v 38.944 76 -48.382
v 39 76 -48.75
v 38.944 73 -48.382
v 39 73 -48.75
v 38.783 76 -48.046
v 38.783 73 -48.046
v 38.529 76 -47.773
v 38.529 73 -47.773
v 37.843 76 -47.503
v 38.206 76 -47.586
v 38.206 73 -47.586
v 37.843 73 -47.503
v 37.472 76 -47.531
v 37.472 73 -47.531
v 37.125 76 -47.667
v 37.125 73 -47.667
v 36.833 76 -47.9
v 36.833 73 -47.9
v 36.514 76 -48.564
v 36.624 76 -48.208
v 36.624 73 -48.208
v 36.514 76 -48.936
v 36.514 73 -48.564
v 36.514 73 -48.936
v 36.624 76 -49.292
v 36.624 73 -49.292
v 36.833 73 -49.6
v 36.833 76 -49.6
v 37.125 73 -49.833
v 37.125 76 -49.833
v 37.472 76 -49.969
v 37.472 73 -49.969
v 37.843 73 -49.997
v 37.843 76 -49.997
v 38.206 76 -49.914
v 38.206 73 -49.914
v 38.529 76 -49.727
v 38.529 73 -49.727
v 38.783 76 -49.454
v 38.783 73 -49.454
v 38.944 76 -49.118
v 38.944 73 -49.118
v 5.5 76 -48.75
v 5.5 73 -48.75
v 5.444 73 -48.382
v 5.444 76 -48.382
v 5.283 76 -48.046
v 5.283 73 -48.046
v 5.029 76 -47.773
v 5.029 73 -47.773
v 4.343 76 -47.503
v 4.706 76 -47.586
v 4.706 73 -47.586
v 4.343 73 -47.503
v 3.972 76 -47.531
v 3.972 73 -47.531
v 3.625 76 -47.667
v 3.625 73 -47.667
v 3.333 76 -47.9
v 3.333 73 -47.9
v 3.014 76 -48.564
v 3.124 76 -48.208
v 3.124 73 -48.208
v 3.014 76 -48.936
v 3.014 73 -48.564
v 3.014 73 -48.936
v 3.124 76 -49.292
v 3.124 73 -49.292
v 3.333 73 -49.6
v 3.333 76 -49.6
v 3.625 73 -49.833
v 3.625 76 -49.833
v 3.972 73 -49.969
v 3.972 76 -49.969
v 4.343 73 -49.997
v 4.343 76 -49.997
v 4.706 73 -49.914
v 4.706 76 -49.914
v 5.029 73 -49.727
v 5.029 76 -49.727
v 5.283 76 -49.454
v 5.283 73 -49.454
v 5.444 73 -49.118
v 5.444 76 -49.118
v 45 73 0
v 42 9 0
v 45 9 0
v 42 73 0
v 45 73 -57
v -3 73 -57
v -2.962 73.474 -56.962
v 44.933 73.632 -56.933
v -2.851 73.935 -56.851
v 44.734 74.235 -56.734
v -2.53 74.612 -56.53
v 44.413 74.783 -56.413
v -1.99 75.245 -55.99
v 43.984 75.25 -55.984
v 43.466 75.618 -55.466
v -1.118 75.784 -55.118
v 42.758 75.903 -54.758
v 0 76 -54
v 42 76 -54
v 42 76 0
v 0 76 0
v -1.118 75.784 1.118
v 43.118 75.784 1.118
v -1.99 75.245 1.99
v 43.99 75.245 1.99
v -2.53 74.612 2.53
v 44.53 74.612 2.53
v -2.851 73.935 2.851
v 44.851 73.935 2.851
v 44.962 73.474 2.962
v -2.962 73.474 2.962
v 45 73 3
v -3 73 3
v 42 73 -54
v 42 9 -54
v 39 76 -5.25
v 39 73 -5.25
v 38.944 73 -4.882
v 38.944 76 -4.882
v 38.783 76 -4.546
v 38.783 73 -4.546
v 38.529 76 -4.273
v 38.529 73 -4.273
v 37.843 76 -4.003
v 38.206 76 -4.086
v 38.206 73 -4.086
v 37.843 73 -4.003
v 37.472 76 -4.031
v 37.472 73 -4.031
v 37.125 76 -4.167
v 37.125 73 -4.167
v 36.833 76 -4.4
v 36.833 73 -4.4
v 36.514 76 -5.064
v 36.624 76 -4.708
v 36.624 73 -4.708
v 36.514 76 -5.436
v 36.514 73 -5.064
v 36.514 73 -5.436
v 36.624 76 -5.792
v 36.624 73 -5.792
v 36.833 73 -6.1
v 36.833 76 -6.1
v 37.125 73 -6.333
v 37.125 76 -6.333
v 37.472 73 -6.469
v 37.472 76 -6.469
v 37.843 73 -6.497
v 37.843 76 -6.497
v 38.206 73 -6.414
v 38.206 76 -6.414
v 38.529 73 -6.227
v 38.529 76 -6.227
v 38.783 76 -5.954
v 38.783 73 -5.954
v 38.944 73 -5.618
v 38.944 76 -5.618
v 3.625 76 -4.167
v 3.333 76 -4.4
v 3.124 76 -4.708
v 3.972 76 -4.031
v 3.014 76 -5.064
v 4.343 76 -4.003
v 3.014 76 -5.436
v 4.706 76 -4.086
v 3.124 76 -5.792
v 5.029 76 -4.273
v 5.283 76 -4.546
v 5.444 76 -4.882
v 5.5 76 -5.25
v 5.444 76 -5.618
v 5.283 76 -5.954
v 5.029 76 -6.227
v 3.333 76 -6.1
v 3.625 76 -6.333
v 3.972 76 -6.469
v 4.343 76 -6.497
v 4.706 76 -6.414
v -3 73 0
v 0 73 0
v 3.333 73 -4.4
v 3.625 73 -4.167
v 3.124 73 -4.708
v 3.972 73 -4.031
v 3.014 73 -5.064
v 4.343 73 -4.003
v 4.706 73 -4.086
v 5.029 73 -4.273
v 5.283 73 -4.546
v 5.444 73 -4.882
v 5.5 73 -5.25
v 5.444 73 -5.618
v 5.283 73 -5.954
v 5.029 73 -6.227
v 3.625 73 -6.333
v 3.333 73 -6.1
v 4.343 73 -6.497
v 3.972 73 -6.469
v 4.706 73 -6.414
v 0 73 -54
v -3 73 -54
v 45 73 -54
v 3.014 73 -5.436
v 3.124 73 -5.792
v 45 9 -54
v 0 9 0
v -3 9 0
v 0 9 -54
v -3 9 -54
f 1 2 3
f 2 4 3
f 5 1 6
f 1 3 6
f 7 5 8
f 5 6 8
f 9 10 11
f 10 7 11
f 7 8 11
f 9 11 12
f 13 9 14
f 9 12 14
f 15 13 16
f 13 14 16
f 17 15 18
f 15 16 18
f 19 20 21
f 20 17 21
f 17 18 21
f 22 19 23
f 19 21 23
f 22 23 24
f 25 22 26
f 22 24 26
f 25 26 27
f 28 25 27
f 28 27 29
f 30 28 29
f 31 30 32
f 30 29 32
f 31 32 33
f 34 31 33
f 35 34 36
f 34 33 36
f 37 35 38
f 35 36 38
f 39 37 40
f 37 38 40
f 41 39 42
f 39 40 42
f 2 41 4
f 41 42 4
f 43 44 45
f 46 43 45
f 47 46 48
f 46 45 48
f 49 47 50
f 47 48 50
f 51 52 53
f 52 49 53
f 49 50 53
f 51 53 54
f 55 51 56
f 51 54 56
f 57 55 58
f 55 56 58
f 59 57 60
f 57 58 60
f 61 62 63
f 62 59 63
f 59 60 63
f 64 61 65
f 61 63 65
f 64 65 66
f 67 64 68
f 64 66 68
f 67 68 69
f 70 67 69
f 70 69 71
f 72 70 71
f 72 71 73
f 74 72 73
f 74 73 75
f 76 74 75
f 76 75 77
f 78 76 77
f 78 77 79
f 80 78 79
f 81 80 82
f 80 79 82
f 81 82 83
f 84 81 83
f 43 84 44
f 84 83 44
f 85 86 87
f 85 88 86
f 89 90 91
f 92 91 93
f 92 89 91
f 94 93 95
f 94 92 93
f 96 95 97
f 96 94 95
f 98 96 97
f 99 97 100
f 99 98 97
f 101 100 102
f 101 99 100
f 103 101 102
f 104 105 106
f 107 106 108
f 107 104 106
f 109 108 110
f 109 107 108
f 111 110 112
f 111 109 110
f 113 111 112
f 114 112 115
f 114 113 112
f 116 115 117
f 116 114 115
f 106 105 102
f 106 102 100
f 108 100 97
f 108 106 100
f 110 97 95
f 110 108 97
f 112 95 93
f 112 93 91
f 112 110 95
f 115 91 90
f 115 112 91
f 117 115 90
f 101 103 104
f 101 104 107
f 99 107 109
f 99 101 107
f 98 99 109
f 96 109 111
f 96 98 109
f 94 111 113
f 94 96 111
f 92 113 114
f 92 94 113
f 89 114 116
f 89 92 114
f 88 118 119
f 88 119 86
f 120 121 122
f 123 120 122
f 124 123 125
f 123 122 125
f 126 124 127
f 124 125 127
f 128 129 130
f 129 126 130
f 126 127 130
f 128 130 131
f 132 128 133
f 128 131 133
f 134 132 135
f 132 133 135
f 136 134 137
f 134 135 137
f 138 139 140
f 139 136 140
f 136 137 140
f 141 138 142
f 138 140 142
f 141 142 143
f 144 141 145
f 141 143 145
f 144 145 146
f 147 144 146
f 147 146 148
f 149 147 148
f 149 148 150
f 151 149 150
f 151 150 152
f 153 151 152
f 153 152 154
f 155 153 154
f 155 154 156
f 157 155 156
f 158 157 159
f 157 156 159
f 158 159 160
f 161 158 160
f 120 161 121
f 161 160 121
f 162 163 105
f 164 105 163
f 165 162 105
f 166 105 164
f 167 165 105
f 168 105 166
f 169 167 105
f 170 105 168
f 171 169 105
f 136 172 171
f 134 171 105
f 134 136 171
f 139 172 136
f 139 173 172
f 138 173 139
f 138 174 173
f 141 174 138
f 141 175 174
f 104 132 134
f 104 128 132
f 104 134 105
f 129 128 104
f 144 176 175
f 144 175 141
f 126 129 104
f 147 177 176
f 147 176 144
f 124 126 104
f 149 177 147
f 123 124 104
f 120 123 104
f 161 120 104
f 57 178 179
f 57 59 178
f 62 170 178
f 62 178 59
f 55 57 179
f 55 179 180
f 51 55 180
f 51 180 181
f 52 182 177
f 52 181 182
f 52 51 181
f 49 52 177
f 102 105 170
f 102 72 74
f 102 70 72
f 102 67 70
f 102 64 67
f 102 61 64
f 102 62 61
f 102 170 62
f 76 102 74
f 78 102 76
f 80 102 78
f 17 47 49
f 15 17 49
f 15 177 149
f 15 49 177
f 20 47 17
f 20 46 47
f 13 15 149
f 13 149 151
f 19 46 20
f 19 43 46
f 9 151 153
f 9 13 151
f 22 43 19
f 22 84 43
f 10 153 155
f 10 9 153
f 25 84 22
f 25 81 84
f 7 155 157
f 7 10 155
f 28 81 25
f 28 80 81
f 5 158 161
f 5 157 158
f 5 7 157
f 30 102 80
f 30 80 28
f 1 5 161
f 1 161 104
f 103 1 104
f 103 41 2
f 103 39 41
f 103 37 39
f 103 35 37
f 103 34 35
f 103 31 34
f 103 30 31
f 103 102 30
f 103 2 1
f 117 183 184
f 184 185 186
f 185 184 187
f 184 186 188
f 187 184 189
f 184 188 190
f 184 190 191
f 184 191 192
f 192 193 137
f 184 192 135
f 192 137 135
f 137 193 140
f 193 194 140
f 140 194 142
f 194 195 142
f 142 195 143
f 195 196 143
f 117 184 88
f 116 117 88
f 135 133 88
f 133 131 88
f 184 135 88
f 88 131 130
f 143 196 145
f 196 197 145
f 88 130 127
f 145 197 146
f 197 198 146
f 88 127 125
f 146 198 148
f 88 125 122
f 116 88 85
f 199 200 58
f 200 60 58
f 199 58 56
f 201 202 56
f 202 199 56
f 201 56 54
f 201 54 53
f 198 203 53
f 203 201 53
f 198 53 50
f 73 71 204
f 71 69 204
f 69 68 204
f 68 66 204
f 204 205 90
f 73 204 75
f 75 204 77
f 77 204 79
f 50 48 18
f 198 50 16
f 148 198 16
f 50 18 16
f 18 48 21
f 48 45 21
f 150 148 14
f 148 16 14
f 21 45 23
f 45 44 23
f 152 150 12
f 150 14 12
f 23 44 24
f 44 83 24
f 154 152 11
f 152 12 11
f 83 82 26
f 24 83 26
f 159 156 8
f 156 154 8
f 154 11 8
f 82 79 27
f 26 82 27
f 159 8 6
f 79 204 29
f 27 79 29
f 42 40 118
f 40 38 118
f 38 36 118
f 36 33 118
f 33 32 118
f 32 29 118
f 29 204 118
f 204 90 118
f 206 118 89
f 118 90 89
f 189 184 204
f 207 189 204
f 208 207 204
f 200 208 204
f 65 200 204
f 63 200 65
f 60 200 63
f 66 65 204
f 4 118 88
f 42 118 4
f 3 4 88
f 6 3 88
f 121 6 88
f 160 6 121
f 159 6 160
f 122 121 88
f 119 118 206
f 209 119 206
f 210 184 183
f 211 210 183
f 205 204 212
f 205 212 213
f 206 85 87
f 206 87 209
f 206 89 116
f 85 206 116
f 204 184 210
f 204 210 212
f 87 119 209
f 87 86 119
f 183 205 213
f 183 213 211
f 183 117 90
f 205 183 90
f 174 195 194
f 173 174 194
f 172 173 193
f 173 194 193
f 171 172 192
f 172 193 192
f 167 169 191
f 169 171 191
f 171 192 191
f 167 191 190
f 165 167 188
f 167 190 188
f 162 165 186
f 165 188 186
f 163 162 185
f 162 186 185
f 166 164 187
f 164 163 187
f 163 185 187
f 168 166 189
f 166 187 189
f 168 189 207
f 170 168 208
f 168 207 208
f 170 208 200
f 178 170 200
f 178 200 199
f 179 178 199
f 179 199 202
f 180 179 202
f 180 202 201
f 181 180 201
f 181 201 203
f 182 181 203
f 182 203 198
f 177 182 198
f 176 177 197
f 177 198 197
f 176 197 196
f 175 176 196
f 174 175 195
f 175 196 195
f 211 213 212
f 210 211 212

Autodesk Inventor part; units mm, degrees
ref_plane "YZ Plane" through (0, 0, 0) normal (1, 0, 0) x (0, 1, 0)
ref_plane "XZ Plane" through (0, 0, 0) normal (0, 1, 0) x (-1, 0, 0)
ref_plane "XY Plane" through (0, 0, 0) normal (0, 0, 1) x (1, 0, 0)
ref_plane "Plano de trabajo1" through (0, 3, 0) normal (0, 1, 0) x (1, 0, 0)
ref_plane "Plano de trabajo2" through (4.2498, 73, -5.25) normal (0, 1, 0) x (1, 0, 0)
sketch "Boceto3" plane through (4.2498, 73, -5.25) normal (0, 1, 0) x (1, 0, 0)
  line L0 (37.7502, 51.75) -> (40.7502, 51.75)
  line L1 (-7.2498, -8.25) -> (40.7502, -8.25)
  line L2 (40.7502, -8.25) -> (40.7502, 51.75)
  line L3 (40.7502, 51.75) -> (-7.2498, 51.75)
  line L4 (-7.2498, 51.75) -> (-7.2498, -8.25)
  circle A0 centre (33.5, 43.5) radius 1.25
  circle A1 centre (33.5, 0) radius 1.25
  circle A2 centre (0, 43.5) radius 1.25
  circle A3 centre (0, 0) radius 1.25
  point P0 (-4.2498, -5.25)
  point P1 (37.7502, -5.25)
  point P2 (37.7502, 48.75)
  dimension "d39" = 2.5
  dimension "d40" = 2.5
  dimension "d41" = 2.5
  dimension "d42" = 2.5
ref_plane "Plano de trabajo3" through (4.2498, 73, -5.25) normal (0, -1, 0) x (1, 0, 0)
sketch "Boceto5" plane through (4.2498, 73, -5.25) normal (0, -1, 0) x (1, 0, 0)
  line L0 (-4.2498, 5.25) -> (-4.2498, -48.75) projected
  line L1 (-4.2498, 5.25) -> (-4.2498, -48.75)
  line L2 (37.7502, -48.75) -> (37.7502, 5.25)
  line L3 (37.7502, 5.25) -> (37.7502, 8.25)
  line L4 (37.7502, -48.75) -> (37.7502, -51.75)
  line L5 (-4.2498, 5.25) -> (-7.2498, 5.25)
  line L6 (-4.2498, -48.75) -> (-7.2498, -48.75)
  line L7 (37.7502, -48.75) -> (40.7502, -48.75)
  line L8 (37.7502, 5.25) -> (40.7502, 5.25)
  line L9 (40.7502, 5.25) -> (40.7502, -48.75)
  line L10 (40.7502, -51.75) -> (40.7502, 8.25) projected
  line L11 (-7.2498, -48.75) -> (-7.2498, 5.25)
  line L12 (-7.2498, 8.25) -> (-7.2498, -51.75) projected
extrude "Extrusión5" add sketch "Boceto5" along normal blind 64
extrude "Extrusión6" add sketch "Boceto3" along normal blind 3
fillet "Empalme3" radius 3 4 edges at (21, 76, 3) (-3, 76, -27) (45, 76, -27) (21, 76, -57)
properties part number "Relé - columnes tapa"
